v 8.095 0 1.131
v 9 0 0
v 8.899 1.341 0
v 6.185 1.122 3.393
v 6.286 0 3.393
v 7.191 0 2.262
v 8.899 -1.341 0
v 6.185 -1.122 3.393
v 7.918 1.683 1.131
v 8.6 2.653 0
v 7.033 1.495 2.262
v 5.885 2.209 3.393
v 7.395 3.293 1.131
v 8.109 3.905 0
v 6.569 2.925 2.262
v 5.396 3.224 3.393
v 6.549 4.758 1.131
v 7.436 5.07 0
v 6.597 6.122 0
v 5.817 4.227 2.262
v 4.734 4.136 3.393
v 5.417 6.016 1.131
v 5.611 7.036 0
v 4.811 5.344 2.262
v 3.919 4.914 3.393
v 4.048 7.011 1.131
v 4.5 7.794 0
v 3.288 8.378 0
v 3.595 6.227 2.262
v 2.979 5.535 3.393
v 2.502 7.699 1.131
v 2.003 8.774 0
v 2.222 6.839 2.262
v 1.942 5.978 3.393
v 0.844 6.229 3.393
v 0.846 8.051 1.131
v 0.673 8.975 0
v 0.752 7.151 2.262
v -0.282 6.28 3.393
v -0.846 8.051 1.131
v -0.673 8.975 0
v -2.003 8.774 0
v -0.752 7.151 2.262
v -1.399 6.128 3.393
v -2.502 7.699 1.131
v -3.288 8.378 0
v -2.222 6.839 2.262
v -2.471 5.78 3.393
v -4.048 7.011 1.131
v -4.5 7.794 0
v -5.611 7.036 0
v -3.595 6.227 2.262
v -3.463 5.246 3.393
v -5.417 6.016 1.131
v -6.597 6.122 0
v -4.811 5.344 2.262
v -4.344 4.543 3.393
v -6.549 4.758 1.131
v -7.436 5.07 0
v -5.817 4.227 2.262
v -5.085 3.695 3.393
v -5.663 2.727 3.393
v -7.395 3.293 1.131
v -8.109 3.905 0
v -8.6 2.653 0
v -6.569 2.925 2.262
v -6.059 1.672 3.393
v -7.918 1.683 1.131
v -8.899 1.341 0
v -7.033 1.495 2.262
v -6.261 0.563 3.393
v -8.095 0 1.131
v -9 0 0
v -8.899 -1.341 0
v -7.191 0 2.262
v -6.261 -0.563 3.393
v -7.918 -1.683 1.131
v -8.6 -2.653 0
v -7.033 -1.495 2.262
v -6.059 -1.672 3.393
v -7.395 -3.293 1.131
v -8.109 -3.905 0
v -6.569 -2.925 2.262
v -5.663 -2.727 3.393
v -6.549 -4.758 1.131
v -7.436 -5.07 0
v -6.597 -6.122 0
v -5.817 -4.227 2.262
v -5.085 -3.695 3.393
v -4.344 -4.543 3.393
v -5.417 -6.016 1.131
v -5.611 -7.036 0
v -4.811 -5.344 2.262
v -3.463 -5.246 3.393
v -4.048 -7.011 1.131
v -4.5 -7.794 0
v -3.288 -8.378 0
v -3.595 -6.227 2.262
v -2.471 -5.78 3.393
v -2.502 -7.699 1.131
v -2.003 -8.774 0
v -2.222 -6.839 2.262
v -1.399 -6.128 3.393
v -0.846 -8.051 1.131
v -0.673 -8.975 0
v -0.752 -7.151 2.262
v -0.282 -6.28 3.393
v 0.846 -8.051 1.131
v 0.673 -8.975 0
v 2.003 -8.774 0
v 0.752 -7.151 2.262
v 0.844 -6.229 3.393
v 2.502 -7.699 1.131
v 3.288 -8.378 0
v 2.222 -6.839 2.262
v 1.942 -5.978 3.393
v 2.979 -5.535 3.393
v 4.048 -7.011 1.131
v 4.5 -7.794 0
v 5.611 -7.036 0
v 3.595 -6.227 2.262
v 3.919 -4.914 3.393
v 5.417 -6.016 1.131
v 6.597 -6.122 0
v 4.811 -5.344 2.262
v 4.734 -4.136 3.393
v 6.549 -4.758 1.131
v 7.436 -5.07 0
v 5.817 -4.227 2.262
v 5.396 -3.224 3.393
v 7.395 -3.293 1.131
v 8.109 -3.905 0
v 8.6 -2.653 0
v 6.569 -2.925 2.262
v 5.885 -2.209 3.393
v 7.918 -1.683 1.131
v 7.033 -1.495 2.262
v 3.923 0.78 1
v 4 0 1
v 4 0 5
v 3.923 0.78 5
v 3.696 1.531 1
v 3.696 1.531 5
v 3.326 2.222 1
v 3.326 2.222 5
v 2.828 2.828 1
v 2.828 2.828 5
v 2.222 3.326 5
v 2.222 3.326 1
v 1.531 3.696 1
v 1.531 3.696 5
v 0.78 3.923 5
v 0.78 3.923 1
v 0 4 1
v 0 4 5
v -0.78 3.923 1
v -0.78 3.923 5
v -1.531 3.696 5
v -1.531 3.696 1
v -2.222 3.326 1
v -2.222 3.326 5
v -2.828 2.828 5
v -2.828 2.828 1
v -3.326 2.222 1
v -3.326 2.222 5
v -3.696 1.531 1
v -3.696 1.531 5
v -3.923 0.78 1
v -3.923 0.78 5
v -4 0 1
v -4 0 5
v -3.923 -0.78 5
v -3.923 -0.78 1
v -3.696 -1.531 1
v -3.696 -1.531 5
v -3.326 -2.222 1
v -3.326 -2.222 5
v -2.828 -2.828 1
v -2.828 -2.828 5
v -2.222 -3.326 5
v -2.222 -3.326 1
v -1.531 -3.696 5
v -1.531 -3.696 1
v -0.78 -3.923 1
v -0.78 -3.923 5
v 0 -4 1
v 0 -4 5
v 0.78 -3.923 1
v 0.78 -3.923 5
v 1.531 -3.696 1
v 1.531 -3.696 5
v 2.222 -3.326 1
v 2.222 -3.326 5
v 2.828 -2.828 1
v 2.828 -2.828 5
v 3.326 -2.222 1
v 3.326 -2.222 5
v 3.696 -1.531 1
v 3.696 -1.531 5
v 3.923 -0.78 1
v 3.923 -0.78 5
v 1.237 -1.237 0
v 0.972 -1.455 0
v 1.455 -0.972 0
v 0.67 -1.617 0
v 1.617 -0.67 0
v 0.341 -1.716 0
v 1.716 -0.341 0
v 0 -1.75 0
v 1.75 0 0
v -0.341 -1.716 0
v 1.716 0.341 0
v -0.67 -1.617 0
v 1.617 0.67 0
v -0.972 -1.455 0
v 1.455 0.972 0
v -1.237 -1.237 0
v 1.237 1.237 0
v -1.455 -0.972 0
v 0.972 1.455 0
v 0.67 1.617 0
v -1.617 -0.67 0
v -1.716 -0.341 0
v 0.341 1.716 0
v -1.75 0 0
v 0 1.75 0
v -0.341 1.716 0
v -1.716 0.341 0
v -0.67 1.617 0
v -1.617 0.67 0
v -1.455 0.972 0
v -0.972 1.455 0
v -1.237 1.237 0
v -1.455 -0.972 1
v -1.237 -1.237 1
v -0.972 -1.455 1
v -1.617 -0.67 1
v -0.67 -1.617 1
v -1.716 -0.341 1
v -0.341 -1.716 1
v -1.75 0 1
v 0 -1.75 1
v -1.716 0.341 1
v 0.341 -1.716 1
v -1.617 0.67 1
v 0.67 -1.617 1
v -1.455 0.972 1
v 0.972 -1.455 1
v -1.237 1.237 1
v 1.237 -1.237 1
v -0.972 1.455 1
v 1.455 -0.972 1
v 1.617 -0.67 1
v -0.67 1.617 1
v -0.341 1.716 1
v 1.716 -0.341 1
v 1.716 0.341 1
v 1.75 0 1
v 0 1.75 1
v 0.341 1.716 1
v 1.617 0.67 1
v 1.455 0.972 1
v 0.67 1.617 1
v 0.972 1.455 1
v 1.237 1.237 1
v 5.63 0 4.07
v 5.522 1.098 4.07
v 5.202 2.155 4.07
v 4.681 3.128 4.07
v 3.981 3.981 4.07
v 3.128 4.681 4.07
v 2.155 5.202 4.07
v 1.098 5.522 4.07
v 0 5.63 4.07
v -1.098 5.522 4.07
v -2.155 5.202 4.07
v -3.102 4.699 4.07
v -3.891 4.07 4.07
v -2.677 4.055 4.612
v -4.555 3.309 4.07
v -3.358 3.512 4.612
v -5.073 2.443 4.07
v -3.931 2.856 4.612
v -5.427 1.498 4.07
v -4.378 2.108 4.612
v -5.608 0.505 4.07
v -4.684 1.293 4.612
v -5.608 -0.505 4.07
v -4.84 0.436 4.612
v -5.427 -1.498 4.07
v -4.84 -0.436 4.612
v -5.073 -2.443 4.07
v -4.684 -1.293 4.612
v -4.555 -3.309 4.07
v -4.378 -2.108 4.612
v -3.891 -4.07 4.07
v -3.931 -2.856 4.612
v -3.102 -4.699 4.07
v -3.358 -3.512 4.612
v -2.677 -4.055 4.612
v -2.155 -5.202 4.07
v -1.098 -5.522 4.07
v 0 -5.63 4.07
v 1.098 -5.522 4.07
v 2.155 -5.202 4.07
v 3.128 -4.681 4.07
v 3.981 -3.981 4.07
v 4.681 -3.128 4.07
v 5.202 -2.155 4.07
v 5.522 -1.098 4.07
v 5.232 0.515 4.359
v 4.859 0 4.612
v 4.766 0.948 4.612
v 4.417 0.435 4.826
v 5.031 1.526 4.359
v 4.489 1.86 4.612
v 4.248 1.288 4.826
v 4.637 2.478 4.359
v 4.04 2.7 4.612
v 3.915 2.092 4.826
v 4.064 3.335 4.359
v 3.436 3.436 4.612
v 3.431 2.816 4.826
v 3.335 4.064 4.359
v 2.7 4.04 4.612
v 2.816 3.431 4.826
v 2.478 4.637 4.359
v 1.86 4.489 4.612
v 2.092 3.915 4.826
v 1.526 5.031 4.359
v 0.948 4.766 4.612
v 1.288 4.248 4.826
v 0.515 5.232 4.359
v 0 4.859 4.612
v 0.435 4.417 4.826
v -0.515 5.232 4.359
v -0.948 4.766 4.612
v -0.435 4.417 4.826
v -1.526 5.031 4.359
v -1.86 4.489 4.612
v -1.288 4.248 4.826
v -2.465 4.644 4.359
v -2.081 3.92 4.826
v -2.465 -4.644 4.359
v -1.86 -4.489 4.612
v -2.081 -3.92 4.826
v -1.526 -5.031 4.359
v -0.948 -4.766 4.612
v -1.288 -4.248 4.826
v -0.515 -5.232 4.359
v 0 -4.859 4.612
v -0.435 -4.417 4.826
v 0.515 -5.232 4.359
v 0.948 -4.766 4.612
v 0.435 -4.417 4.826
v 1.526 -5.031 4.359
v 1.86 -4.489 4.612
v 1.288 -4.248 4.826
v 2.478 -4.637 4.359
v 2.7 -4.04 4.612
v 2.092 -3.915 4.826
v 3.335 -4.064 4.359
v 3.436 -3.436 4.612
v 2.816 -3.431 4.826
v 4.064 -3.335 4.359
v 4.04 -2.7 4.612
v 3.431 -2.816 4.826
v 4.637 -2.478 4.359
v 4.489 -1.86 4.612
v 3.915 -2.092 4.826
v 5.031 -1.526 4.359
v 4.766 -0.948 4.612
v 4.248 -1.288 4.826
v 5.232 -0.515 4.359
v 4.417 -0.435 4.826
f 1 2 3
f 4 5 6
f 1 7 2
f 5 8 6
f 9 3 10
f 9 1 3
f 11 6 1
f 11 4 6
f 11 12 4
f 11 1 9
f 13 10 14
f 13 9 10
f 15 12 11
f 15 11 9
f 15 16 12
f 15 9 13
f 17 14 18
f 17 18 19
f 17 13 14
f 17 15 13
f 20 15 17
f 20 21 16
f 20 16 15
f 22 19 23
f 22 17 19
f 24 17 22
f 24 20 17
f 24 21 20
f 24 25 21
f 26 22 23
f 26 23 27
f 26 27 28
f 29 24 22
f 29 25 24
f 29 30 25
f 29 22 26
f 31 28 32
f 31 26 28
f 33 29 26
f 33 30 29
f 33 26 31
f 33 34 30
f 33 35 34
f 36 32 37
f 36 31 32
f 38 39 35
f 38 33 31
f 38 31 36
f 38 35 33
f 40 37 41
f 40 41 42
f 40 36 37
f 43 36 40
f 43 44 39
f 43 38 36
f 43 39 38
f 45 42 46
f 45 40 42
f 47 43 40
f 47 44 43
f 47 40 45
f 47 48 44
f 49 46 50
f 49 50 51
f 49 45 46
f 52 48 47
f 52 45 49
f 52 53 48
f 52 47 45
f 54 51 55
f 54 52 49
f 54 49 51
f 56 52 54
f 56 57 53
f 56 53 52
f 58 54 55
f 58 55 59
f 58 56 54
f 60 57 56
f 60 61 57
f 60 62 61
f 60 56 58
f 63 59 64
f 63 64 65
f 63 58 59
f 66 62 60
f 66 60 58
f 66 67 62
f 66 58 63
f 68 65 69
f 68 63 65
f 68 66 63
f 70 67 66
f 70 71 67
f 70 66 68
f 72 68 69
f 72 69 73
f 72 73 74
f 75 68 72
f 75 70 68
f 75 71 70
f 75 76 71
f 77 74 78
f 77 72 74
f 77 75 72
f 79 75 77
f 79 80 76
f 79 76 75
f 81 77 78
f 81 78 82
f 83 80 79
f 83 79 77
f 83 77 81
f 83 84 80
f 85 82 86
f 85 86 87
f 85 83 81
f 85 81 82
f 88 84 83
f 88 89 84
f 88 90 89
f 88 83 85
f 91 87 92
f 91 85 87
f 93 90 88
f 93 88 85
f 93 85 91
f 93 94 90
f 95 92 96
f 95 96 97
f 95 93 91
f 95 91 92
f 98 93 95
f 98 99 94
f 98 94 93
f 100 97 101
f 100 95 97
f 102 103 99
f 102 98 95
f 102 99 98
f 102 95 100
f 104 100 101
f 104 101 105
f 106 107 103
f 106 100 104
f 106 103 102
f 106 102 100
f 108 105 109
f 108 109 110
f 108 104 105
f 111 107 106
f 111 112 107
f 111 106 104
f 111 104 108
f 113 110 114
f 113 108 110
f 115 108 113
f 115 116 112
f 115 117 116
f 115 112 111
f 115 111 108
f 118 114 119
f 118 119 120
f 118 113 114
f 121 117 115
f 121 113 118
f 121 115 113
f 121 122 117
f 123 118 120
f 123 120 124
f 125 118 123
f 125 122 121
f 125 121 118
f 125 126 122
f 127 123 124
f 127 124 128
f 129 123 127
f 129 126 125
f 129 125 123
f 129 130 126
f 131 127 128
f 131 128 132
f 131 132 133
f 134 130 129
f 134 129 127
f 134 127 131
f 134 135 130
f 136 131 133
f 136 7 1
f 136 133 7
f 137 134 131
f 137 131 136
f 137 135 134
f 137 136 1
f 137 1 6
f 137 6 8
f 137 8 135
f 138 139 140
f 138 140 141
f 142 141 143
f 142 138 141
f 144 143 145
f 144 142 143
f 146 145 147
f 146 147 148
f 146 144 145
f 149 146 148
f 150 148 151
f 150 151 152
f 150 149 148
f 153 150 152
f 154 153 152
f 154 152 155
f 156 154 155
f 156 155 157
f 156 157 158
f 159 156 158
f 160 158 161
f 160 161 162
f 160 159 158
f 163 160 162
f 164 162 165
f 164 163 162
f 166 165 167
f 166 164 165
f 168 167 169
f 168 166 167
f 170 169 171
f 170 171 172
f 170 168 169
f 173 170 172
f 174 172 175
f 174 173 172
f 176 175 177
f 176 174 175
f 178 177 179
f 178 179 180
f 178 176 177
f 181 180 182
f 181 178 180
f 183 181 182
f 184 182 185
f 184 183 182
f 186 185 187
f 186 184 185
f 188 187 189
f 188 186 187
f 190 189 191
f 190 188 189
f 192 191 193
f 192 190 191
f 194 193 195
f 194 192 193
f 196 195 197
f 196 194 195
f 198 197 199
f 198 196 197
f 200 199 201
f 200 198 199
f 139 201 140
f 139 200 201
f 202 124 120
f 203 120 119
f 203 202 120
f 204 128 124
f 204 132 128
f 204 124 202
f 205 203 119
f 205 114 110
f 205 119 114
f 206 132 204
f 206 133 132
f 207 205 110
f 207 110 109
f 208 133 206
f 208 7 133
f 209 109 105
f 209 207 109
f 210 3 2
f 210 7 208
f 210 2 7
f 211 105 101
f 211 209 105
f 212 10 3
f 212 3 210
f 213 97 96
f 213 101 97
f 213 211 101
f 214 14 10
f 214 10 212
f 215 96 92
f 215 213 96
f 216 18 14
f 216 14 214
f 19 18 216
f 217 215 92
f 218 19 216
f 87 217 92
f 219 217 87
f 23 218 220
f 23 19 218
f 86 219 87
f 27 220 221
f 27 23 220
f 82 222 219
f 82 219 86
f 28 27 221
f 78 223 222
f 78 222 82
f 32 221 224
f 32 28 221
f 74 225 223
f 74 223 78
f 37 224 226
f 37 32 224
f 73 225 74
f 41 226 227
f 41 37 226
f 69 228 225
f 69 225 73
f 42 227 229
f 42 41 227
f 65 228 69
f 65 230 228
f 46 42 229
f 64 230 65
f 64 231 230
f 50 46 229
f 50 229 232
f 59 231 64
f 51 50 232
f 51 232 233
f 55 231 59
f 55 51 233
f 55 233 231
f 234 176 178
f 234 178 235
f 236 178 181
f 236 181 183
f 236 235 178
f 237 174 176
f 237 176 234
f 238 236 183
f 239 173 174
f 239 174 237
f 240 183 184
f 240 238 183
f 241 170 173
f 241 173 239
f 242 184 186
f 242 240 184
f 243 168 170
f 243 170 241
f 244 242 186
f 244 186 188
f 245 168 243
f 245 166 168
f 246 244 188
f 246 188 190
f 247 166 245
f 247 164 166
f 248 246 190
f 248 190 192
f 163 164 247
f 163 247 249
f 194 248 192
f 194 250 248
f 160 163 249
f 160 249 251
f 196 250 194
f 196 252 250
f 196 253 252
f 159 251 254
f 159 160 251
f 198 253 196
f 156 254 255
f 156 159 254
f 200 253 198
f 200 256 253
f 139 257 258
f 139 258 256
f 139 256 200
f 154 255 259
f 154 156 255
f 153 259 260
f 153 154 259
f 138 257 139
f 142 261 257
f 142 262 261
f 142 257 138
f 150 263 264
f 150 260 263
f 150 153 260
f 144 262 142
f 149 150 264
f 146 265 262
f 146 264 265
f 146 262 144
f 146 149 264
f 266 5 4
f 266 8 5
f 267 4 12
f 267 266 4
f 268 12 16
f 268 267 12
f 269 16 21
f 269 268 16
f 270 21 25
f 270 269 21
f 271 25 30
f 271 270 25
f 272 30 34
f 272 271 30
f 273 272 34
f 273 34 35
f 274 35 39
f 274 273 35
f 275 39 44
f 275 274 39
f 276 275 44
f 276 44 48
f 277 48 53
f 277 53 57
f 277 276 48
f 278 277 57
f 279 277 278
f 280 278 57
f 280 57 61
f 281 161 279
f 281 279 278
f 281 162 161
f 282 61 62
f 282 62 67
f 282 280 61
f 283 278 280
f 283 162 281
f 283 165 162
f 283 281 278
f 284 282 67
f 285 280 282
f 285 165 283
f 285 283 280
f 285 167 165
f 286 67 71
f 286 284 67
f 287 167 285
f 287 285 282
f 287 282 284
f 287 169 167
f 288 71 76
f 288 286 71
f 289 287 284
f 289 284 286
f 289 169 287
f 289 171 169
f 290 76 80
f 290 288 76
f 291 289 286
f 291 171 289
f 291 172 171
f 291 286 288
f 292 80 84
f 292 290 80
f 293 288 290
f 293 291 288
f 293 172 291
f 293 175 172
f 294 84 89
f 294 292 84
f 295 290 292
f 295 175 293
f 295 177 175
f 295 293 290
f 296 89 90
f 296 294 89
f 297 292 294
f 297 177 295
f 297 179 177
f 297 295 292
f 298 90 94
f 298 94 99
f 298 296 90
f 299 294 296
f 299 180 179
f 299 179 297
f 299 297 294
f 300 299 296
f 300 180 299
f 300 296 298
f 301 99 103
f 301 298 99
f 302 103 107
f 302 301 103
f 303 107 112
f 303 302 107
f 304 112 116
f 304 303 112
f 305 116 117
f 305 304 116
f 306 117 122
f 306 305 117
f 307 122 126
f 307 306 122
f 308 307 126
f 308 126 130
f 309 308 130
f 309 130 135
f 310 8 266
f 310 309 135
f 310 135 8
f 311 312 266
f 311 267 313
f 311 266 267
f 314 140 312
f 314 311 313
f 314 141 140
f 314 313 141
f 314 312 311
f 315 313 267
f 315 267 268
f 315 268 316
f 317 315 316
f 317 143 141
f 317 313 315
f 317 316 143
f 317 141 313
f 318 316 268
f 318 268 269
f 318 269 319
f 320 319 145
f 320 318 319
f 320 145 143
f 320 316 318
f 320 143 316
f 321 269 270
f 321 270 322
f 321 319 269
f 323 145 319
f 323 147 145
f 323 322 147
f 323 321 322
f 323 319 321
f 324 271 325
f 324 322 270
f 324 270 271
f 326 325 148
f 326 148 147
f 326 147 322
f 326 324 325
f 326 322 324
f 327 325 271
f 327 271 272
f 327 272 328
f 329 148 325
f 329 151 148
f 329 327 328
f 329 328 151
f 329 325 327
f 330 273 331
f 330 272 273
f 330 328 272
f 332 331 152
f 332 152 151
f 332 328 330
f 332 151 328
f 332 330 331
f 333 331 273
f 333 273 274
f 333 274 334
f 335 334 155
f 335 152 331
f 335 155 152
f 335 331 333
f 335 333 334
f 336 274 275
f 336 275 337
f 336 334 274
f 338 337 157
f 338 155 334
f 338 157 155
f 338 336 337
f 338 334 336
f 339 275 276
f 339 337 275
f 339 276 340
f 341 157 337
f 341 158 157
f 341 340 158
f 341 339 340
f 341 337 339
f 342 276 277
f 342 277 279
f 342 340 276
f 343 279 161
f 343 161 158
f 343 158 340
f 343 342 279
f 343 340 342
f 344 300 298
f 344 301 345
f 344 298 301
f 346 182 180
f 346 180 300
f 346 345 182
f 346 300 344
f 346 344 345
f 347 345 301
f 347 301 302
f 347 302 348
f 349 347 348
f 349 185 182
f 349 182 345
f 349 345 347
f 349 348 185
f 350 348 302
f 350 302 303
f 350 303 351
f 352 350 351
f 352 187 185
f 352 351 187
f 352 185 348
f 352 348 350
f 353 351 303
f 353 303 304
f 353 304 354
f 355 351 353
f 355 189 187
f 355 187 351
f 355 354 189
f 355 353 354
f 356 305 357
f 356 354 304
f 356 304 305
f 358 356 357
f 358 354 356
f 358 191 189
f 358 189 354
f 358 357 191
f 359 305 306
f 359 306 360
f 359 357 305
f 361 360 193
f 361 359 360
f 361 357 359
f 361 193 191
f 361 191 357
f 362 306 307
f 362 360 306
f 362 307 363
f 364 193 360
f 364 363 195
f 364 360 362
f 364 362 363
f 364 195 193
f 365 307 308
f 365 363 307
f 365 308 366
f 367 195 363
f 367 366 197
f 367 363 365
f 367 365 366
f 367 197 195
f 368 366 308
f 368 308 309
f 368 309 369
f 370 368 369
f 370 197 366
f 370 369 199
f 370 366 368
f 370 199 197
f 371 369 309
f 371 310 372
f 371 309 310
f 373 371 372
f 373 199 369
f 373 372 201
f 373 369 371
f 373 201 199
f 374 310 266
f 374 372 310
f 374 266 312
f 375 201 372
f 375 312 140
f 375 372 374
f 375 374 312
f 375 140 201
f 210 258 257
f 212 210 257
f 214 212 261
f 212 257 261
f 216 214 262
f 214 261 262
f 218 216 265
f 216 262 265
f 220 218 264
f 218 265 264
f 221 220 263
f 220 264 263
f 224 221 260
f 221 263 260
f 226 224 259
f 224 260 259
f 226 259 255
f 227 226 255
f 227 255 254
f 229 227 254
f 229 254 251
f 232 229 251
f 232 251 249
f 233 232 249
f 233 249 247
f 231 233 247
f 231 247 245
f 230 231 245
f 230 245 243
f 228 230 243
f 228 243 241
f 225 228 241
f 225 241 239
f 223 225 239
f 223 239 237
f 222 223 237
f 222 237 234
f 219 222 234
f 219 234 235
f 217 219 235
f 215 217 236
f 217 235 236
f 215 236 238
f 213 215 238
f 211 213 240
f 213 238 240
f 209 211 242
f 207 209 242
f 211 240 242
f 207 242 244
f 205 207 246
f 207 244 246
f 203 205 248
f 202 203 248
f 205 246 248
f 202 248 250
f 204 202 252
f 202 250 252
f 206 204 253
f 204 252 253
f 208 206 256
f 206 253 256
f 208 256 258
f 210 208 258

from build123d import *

# Parameters (mm, degrees)
F2_R     = 1.75
F3_DEPTH = 1.001


# Not quite as in the source:
# - a fillet or chamfer that OpenCascade refuses, or shapes differently, is made with other operations: its cross-section is extruded or revolved along the edge and cut away or added


with BuildPart() as f1:
    # F0 (on Front) → F1 (revolve)
    with BuildSketch(Plane.XZ):
        Polygon((0, 1), (0, 0), (9, 0), (5, 5), (4, 5), (4, 1), align=None)
    revolve(axis=Axis((0, 0, 2.5), (0, 0, 1)))

    # F2 (on face) → F3 (cut, through all)
    with BuildSketch(Plane.XY.offset(1)):
        Circle(F2_R)
    extrude(amount=-F3_DEPTH, mode=Mode.SUBTRACT)

    # F4: fillet of radius 5 on 1 edges, made by hand

    # F4_s1 → F4_t2 (revolve, cut)
    with BuildSketch(Plane.XZ):
        with BuildLine():
            ThreePointArc((6.2858644818, 3.3926693977), (5.2575025417, 4.3592707998), (4, 5))
            Line((4, 5), (5, 5))
            Line((5, 5), (6.2858644818, 3.3926693977))
        make_face()
    revolve(axis=Axis((0, 0, 5), (0, 0, 1)), mode=Mode.SUBTRACT)


solid = f1.part
